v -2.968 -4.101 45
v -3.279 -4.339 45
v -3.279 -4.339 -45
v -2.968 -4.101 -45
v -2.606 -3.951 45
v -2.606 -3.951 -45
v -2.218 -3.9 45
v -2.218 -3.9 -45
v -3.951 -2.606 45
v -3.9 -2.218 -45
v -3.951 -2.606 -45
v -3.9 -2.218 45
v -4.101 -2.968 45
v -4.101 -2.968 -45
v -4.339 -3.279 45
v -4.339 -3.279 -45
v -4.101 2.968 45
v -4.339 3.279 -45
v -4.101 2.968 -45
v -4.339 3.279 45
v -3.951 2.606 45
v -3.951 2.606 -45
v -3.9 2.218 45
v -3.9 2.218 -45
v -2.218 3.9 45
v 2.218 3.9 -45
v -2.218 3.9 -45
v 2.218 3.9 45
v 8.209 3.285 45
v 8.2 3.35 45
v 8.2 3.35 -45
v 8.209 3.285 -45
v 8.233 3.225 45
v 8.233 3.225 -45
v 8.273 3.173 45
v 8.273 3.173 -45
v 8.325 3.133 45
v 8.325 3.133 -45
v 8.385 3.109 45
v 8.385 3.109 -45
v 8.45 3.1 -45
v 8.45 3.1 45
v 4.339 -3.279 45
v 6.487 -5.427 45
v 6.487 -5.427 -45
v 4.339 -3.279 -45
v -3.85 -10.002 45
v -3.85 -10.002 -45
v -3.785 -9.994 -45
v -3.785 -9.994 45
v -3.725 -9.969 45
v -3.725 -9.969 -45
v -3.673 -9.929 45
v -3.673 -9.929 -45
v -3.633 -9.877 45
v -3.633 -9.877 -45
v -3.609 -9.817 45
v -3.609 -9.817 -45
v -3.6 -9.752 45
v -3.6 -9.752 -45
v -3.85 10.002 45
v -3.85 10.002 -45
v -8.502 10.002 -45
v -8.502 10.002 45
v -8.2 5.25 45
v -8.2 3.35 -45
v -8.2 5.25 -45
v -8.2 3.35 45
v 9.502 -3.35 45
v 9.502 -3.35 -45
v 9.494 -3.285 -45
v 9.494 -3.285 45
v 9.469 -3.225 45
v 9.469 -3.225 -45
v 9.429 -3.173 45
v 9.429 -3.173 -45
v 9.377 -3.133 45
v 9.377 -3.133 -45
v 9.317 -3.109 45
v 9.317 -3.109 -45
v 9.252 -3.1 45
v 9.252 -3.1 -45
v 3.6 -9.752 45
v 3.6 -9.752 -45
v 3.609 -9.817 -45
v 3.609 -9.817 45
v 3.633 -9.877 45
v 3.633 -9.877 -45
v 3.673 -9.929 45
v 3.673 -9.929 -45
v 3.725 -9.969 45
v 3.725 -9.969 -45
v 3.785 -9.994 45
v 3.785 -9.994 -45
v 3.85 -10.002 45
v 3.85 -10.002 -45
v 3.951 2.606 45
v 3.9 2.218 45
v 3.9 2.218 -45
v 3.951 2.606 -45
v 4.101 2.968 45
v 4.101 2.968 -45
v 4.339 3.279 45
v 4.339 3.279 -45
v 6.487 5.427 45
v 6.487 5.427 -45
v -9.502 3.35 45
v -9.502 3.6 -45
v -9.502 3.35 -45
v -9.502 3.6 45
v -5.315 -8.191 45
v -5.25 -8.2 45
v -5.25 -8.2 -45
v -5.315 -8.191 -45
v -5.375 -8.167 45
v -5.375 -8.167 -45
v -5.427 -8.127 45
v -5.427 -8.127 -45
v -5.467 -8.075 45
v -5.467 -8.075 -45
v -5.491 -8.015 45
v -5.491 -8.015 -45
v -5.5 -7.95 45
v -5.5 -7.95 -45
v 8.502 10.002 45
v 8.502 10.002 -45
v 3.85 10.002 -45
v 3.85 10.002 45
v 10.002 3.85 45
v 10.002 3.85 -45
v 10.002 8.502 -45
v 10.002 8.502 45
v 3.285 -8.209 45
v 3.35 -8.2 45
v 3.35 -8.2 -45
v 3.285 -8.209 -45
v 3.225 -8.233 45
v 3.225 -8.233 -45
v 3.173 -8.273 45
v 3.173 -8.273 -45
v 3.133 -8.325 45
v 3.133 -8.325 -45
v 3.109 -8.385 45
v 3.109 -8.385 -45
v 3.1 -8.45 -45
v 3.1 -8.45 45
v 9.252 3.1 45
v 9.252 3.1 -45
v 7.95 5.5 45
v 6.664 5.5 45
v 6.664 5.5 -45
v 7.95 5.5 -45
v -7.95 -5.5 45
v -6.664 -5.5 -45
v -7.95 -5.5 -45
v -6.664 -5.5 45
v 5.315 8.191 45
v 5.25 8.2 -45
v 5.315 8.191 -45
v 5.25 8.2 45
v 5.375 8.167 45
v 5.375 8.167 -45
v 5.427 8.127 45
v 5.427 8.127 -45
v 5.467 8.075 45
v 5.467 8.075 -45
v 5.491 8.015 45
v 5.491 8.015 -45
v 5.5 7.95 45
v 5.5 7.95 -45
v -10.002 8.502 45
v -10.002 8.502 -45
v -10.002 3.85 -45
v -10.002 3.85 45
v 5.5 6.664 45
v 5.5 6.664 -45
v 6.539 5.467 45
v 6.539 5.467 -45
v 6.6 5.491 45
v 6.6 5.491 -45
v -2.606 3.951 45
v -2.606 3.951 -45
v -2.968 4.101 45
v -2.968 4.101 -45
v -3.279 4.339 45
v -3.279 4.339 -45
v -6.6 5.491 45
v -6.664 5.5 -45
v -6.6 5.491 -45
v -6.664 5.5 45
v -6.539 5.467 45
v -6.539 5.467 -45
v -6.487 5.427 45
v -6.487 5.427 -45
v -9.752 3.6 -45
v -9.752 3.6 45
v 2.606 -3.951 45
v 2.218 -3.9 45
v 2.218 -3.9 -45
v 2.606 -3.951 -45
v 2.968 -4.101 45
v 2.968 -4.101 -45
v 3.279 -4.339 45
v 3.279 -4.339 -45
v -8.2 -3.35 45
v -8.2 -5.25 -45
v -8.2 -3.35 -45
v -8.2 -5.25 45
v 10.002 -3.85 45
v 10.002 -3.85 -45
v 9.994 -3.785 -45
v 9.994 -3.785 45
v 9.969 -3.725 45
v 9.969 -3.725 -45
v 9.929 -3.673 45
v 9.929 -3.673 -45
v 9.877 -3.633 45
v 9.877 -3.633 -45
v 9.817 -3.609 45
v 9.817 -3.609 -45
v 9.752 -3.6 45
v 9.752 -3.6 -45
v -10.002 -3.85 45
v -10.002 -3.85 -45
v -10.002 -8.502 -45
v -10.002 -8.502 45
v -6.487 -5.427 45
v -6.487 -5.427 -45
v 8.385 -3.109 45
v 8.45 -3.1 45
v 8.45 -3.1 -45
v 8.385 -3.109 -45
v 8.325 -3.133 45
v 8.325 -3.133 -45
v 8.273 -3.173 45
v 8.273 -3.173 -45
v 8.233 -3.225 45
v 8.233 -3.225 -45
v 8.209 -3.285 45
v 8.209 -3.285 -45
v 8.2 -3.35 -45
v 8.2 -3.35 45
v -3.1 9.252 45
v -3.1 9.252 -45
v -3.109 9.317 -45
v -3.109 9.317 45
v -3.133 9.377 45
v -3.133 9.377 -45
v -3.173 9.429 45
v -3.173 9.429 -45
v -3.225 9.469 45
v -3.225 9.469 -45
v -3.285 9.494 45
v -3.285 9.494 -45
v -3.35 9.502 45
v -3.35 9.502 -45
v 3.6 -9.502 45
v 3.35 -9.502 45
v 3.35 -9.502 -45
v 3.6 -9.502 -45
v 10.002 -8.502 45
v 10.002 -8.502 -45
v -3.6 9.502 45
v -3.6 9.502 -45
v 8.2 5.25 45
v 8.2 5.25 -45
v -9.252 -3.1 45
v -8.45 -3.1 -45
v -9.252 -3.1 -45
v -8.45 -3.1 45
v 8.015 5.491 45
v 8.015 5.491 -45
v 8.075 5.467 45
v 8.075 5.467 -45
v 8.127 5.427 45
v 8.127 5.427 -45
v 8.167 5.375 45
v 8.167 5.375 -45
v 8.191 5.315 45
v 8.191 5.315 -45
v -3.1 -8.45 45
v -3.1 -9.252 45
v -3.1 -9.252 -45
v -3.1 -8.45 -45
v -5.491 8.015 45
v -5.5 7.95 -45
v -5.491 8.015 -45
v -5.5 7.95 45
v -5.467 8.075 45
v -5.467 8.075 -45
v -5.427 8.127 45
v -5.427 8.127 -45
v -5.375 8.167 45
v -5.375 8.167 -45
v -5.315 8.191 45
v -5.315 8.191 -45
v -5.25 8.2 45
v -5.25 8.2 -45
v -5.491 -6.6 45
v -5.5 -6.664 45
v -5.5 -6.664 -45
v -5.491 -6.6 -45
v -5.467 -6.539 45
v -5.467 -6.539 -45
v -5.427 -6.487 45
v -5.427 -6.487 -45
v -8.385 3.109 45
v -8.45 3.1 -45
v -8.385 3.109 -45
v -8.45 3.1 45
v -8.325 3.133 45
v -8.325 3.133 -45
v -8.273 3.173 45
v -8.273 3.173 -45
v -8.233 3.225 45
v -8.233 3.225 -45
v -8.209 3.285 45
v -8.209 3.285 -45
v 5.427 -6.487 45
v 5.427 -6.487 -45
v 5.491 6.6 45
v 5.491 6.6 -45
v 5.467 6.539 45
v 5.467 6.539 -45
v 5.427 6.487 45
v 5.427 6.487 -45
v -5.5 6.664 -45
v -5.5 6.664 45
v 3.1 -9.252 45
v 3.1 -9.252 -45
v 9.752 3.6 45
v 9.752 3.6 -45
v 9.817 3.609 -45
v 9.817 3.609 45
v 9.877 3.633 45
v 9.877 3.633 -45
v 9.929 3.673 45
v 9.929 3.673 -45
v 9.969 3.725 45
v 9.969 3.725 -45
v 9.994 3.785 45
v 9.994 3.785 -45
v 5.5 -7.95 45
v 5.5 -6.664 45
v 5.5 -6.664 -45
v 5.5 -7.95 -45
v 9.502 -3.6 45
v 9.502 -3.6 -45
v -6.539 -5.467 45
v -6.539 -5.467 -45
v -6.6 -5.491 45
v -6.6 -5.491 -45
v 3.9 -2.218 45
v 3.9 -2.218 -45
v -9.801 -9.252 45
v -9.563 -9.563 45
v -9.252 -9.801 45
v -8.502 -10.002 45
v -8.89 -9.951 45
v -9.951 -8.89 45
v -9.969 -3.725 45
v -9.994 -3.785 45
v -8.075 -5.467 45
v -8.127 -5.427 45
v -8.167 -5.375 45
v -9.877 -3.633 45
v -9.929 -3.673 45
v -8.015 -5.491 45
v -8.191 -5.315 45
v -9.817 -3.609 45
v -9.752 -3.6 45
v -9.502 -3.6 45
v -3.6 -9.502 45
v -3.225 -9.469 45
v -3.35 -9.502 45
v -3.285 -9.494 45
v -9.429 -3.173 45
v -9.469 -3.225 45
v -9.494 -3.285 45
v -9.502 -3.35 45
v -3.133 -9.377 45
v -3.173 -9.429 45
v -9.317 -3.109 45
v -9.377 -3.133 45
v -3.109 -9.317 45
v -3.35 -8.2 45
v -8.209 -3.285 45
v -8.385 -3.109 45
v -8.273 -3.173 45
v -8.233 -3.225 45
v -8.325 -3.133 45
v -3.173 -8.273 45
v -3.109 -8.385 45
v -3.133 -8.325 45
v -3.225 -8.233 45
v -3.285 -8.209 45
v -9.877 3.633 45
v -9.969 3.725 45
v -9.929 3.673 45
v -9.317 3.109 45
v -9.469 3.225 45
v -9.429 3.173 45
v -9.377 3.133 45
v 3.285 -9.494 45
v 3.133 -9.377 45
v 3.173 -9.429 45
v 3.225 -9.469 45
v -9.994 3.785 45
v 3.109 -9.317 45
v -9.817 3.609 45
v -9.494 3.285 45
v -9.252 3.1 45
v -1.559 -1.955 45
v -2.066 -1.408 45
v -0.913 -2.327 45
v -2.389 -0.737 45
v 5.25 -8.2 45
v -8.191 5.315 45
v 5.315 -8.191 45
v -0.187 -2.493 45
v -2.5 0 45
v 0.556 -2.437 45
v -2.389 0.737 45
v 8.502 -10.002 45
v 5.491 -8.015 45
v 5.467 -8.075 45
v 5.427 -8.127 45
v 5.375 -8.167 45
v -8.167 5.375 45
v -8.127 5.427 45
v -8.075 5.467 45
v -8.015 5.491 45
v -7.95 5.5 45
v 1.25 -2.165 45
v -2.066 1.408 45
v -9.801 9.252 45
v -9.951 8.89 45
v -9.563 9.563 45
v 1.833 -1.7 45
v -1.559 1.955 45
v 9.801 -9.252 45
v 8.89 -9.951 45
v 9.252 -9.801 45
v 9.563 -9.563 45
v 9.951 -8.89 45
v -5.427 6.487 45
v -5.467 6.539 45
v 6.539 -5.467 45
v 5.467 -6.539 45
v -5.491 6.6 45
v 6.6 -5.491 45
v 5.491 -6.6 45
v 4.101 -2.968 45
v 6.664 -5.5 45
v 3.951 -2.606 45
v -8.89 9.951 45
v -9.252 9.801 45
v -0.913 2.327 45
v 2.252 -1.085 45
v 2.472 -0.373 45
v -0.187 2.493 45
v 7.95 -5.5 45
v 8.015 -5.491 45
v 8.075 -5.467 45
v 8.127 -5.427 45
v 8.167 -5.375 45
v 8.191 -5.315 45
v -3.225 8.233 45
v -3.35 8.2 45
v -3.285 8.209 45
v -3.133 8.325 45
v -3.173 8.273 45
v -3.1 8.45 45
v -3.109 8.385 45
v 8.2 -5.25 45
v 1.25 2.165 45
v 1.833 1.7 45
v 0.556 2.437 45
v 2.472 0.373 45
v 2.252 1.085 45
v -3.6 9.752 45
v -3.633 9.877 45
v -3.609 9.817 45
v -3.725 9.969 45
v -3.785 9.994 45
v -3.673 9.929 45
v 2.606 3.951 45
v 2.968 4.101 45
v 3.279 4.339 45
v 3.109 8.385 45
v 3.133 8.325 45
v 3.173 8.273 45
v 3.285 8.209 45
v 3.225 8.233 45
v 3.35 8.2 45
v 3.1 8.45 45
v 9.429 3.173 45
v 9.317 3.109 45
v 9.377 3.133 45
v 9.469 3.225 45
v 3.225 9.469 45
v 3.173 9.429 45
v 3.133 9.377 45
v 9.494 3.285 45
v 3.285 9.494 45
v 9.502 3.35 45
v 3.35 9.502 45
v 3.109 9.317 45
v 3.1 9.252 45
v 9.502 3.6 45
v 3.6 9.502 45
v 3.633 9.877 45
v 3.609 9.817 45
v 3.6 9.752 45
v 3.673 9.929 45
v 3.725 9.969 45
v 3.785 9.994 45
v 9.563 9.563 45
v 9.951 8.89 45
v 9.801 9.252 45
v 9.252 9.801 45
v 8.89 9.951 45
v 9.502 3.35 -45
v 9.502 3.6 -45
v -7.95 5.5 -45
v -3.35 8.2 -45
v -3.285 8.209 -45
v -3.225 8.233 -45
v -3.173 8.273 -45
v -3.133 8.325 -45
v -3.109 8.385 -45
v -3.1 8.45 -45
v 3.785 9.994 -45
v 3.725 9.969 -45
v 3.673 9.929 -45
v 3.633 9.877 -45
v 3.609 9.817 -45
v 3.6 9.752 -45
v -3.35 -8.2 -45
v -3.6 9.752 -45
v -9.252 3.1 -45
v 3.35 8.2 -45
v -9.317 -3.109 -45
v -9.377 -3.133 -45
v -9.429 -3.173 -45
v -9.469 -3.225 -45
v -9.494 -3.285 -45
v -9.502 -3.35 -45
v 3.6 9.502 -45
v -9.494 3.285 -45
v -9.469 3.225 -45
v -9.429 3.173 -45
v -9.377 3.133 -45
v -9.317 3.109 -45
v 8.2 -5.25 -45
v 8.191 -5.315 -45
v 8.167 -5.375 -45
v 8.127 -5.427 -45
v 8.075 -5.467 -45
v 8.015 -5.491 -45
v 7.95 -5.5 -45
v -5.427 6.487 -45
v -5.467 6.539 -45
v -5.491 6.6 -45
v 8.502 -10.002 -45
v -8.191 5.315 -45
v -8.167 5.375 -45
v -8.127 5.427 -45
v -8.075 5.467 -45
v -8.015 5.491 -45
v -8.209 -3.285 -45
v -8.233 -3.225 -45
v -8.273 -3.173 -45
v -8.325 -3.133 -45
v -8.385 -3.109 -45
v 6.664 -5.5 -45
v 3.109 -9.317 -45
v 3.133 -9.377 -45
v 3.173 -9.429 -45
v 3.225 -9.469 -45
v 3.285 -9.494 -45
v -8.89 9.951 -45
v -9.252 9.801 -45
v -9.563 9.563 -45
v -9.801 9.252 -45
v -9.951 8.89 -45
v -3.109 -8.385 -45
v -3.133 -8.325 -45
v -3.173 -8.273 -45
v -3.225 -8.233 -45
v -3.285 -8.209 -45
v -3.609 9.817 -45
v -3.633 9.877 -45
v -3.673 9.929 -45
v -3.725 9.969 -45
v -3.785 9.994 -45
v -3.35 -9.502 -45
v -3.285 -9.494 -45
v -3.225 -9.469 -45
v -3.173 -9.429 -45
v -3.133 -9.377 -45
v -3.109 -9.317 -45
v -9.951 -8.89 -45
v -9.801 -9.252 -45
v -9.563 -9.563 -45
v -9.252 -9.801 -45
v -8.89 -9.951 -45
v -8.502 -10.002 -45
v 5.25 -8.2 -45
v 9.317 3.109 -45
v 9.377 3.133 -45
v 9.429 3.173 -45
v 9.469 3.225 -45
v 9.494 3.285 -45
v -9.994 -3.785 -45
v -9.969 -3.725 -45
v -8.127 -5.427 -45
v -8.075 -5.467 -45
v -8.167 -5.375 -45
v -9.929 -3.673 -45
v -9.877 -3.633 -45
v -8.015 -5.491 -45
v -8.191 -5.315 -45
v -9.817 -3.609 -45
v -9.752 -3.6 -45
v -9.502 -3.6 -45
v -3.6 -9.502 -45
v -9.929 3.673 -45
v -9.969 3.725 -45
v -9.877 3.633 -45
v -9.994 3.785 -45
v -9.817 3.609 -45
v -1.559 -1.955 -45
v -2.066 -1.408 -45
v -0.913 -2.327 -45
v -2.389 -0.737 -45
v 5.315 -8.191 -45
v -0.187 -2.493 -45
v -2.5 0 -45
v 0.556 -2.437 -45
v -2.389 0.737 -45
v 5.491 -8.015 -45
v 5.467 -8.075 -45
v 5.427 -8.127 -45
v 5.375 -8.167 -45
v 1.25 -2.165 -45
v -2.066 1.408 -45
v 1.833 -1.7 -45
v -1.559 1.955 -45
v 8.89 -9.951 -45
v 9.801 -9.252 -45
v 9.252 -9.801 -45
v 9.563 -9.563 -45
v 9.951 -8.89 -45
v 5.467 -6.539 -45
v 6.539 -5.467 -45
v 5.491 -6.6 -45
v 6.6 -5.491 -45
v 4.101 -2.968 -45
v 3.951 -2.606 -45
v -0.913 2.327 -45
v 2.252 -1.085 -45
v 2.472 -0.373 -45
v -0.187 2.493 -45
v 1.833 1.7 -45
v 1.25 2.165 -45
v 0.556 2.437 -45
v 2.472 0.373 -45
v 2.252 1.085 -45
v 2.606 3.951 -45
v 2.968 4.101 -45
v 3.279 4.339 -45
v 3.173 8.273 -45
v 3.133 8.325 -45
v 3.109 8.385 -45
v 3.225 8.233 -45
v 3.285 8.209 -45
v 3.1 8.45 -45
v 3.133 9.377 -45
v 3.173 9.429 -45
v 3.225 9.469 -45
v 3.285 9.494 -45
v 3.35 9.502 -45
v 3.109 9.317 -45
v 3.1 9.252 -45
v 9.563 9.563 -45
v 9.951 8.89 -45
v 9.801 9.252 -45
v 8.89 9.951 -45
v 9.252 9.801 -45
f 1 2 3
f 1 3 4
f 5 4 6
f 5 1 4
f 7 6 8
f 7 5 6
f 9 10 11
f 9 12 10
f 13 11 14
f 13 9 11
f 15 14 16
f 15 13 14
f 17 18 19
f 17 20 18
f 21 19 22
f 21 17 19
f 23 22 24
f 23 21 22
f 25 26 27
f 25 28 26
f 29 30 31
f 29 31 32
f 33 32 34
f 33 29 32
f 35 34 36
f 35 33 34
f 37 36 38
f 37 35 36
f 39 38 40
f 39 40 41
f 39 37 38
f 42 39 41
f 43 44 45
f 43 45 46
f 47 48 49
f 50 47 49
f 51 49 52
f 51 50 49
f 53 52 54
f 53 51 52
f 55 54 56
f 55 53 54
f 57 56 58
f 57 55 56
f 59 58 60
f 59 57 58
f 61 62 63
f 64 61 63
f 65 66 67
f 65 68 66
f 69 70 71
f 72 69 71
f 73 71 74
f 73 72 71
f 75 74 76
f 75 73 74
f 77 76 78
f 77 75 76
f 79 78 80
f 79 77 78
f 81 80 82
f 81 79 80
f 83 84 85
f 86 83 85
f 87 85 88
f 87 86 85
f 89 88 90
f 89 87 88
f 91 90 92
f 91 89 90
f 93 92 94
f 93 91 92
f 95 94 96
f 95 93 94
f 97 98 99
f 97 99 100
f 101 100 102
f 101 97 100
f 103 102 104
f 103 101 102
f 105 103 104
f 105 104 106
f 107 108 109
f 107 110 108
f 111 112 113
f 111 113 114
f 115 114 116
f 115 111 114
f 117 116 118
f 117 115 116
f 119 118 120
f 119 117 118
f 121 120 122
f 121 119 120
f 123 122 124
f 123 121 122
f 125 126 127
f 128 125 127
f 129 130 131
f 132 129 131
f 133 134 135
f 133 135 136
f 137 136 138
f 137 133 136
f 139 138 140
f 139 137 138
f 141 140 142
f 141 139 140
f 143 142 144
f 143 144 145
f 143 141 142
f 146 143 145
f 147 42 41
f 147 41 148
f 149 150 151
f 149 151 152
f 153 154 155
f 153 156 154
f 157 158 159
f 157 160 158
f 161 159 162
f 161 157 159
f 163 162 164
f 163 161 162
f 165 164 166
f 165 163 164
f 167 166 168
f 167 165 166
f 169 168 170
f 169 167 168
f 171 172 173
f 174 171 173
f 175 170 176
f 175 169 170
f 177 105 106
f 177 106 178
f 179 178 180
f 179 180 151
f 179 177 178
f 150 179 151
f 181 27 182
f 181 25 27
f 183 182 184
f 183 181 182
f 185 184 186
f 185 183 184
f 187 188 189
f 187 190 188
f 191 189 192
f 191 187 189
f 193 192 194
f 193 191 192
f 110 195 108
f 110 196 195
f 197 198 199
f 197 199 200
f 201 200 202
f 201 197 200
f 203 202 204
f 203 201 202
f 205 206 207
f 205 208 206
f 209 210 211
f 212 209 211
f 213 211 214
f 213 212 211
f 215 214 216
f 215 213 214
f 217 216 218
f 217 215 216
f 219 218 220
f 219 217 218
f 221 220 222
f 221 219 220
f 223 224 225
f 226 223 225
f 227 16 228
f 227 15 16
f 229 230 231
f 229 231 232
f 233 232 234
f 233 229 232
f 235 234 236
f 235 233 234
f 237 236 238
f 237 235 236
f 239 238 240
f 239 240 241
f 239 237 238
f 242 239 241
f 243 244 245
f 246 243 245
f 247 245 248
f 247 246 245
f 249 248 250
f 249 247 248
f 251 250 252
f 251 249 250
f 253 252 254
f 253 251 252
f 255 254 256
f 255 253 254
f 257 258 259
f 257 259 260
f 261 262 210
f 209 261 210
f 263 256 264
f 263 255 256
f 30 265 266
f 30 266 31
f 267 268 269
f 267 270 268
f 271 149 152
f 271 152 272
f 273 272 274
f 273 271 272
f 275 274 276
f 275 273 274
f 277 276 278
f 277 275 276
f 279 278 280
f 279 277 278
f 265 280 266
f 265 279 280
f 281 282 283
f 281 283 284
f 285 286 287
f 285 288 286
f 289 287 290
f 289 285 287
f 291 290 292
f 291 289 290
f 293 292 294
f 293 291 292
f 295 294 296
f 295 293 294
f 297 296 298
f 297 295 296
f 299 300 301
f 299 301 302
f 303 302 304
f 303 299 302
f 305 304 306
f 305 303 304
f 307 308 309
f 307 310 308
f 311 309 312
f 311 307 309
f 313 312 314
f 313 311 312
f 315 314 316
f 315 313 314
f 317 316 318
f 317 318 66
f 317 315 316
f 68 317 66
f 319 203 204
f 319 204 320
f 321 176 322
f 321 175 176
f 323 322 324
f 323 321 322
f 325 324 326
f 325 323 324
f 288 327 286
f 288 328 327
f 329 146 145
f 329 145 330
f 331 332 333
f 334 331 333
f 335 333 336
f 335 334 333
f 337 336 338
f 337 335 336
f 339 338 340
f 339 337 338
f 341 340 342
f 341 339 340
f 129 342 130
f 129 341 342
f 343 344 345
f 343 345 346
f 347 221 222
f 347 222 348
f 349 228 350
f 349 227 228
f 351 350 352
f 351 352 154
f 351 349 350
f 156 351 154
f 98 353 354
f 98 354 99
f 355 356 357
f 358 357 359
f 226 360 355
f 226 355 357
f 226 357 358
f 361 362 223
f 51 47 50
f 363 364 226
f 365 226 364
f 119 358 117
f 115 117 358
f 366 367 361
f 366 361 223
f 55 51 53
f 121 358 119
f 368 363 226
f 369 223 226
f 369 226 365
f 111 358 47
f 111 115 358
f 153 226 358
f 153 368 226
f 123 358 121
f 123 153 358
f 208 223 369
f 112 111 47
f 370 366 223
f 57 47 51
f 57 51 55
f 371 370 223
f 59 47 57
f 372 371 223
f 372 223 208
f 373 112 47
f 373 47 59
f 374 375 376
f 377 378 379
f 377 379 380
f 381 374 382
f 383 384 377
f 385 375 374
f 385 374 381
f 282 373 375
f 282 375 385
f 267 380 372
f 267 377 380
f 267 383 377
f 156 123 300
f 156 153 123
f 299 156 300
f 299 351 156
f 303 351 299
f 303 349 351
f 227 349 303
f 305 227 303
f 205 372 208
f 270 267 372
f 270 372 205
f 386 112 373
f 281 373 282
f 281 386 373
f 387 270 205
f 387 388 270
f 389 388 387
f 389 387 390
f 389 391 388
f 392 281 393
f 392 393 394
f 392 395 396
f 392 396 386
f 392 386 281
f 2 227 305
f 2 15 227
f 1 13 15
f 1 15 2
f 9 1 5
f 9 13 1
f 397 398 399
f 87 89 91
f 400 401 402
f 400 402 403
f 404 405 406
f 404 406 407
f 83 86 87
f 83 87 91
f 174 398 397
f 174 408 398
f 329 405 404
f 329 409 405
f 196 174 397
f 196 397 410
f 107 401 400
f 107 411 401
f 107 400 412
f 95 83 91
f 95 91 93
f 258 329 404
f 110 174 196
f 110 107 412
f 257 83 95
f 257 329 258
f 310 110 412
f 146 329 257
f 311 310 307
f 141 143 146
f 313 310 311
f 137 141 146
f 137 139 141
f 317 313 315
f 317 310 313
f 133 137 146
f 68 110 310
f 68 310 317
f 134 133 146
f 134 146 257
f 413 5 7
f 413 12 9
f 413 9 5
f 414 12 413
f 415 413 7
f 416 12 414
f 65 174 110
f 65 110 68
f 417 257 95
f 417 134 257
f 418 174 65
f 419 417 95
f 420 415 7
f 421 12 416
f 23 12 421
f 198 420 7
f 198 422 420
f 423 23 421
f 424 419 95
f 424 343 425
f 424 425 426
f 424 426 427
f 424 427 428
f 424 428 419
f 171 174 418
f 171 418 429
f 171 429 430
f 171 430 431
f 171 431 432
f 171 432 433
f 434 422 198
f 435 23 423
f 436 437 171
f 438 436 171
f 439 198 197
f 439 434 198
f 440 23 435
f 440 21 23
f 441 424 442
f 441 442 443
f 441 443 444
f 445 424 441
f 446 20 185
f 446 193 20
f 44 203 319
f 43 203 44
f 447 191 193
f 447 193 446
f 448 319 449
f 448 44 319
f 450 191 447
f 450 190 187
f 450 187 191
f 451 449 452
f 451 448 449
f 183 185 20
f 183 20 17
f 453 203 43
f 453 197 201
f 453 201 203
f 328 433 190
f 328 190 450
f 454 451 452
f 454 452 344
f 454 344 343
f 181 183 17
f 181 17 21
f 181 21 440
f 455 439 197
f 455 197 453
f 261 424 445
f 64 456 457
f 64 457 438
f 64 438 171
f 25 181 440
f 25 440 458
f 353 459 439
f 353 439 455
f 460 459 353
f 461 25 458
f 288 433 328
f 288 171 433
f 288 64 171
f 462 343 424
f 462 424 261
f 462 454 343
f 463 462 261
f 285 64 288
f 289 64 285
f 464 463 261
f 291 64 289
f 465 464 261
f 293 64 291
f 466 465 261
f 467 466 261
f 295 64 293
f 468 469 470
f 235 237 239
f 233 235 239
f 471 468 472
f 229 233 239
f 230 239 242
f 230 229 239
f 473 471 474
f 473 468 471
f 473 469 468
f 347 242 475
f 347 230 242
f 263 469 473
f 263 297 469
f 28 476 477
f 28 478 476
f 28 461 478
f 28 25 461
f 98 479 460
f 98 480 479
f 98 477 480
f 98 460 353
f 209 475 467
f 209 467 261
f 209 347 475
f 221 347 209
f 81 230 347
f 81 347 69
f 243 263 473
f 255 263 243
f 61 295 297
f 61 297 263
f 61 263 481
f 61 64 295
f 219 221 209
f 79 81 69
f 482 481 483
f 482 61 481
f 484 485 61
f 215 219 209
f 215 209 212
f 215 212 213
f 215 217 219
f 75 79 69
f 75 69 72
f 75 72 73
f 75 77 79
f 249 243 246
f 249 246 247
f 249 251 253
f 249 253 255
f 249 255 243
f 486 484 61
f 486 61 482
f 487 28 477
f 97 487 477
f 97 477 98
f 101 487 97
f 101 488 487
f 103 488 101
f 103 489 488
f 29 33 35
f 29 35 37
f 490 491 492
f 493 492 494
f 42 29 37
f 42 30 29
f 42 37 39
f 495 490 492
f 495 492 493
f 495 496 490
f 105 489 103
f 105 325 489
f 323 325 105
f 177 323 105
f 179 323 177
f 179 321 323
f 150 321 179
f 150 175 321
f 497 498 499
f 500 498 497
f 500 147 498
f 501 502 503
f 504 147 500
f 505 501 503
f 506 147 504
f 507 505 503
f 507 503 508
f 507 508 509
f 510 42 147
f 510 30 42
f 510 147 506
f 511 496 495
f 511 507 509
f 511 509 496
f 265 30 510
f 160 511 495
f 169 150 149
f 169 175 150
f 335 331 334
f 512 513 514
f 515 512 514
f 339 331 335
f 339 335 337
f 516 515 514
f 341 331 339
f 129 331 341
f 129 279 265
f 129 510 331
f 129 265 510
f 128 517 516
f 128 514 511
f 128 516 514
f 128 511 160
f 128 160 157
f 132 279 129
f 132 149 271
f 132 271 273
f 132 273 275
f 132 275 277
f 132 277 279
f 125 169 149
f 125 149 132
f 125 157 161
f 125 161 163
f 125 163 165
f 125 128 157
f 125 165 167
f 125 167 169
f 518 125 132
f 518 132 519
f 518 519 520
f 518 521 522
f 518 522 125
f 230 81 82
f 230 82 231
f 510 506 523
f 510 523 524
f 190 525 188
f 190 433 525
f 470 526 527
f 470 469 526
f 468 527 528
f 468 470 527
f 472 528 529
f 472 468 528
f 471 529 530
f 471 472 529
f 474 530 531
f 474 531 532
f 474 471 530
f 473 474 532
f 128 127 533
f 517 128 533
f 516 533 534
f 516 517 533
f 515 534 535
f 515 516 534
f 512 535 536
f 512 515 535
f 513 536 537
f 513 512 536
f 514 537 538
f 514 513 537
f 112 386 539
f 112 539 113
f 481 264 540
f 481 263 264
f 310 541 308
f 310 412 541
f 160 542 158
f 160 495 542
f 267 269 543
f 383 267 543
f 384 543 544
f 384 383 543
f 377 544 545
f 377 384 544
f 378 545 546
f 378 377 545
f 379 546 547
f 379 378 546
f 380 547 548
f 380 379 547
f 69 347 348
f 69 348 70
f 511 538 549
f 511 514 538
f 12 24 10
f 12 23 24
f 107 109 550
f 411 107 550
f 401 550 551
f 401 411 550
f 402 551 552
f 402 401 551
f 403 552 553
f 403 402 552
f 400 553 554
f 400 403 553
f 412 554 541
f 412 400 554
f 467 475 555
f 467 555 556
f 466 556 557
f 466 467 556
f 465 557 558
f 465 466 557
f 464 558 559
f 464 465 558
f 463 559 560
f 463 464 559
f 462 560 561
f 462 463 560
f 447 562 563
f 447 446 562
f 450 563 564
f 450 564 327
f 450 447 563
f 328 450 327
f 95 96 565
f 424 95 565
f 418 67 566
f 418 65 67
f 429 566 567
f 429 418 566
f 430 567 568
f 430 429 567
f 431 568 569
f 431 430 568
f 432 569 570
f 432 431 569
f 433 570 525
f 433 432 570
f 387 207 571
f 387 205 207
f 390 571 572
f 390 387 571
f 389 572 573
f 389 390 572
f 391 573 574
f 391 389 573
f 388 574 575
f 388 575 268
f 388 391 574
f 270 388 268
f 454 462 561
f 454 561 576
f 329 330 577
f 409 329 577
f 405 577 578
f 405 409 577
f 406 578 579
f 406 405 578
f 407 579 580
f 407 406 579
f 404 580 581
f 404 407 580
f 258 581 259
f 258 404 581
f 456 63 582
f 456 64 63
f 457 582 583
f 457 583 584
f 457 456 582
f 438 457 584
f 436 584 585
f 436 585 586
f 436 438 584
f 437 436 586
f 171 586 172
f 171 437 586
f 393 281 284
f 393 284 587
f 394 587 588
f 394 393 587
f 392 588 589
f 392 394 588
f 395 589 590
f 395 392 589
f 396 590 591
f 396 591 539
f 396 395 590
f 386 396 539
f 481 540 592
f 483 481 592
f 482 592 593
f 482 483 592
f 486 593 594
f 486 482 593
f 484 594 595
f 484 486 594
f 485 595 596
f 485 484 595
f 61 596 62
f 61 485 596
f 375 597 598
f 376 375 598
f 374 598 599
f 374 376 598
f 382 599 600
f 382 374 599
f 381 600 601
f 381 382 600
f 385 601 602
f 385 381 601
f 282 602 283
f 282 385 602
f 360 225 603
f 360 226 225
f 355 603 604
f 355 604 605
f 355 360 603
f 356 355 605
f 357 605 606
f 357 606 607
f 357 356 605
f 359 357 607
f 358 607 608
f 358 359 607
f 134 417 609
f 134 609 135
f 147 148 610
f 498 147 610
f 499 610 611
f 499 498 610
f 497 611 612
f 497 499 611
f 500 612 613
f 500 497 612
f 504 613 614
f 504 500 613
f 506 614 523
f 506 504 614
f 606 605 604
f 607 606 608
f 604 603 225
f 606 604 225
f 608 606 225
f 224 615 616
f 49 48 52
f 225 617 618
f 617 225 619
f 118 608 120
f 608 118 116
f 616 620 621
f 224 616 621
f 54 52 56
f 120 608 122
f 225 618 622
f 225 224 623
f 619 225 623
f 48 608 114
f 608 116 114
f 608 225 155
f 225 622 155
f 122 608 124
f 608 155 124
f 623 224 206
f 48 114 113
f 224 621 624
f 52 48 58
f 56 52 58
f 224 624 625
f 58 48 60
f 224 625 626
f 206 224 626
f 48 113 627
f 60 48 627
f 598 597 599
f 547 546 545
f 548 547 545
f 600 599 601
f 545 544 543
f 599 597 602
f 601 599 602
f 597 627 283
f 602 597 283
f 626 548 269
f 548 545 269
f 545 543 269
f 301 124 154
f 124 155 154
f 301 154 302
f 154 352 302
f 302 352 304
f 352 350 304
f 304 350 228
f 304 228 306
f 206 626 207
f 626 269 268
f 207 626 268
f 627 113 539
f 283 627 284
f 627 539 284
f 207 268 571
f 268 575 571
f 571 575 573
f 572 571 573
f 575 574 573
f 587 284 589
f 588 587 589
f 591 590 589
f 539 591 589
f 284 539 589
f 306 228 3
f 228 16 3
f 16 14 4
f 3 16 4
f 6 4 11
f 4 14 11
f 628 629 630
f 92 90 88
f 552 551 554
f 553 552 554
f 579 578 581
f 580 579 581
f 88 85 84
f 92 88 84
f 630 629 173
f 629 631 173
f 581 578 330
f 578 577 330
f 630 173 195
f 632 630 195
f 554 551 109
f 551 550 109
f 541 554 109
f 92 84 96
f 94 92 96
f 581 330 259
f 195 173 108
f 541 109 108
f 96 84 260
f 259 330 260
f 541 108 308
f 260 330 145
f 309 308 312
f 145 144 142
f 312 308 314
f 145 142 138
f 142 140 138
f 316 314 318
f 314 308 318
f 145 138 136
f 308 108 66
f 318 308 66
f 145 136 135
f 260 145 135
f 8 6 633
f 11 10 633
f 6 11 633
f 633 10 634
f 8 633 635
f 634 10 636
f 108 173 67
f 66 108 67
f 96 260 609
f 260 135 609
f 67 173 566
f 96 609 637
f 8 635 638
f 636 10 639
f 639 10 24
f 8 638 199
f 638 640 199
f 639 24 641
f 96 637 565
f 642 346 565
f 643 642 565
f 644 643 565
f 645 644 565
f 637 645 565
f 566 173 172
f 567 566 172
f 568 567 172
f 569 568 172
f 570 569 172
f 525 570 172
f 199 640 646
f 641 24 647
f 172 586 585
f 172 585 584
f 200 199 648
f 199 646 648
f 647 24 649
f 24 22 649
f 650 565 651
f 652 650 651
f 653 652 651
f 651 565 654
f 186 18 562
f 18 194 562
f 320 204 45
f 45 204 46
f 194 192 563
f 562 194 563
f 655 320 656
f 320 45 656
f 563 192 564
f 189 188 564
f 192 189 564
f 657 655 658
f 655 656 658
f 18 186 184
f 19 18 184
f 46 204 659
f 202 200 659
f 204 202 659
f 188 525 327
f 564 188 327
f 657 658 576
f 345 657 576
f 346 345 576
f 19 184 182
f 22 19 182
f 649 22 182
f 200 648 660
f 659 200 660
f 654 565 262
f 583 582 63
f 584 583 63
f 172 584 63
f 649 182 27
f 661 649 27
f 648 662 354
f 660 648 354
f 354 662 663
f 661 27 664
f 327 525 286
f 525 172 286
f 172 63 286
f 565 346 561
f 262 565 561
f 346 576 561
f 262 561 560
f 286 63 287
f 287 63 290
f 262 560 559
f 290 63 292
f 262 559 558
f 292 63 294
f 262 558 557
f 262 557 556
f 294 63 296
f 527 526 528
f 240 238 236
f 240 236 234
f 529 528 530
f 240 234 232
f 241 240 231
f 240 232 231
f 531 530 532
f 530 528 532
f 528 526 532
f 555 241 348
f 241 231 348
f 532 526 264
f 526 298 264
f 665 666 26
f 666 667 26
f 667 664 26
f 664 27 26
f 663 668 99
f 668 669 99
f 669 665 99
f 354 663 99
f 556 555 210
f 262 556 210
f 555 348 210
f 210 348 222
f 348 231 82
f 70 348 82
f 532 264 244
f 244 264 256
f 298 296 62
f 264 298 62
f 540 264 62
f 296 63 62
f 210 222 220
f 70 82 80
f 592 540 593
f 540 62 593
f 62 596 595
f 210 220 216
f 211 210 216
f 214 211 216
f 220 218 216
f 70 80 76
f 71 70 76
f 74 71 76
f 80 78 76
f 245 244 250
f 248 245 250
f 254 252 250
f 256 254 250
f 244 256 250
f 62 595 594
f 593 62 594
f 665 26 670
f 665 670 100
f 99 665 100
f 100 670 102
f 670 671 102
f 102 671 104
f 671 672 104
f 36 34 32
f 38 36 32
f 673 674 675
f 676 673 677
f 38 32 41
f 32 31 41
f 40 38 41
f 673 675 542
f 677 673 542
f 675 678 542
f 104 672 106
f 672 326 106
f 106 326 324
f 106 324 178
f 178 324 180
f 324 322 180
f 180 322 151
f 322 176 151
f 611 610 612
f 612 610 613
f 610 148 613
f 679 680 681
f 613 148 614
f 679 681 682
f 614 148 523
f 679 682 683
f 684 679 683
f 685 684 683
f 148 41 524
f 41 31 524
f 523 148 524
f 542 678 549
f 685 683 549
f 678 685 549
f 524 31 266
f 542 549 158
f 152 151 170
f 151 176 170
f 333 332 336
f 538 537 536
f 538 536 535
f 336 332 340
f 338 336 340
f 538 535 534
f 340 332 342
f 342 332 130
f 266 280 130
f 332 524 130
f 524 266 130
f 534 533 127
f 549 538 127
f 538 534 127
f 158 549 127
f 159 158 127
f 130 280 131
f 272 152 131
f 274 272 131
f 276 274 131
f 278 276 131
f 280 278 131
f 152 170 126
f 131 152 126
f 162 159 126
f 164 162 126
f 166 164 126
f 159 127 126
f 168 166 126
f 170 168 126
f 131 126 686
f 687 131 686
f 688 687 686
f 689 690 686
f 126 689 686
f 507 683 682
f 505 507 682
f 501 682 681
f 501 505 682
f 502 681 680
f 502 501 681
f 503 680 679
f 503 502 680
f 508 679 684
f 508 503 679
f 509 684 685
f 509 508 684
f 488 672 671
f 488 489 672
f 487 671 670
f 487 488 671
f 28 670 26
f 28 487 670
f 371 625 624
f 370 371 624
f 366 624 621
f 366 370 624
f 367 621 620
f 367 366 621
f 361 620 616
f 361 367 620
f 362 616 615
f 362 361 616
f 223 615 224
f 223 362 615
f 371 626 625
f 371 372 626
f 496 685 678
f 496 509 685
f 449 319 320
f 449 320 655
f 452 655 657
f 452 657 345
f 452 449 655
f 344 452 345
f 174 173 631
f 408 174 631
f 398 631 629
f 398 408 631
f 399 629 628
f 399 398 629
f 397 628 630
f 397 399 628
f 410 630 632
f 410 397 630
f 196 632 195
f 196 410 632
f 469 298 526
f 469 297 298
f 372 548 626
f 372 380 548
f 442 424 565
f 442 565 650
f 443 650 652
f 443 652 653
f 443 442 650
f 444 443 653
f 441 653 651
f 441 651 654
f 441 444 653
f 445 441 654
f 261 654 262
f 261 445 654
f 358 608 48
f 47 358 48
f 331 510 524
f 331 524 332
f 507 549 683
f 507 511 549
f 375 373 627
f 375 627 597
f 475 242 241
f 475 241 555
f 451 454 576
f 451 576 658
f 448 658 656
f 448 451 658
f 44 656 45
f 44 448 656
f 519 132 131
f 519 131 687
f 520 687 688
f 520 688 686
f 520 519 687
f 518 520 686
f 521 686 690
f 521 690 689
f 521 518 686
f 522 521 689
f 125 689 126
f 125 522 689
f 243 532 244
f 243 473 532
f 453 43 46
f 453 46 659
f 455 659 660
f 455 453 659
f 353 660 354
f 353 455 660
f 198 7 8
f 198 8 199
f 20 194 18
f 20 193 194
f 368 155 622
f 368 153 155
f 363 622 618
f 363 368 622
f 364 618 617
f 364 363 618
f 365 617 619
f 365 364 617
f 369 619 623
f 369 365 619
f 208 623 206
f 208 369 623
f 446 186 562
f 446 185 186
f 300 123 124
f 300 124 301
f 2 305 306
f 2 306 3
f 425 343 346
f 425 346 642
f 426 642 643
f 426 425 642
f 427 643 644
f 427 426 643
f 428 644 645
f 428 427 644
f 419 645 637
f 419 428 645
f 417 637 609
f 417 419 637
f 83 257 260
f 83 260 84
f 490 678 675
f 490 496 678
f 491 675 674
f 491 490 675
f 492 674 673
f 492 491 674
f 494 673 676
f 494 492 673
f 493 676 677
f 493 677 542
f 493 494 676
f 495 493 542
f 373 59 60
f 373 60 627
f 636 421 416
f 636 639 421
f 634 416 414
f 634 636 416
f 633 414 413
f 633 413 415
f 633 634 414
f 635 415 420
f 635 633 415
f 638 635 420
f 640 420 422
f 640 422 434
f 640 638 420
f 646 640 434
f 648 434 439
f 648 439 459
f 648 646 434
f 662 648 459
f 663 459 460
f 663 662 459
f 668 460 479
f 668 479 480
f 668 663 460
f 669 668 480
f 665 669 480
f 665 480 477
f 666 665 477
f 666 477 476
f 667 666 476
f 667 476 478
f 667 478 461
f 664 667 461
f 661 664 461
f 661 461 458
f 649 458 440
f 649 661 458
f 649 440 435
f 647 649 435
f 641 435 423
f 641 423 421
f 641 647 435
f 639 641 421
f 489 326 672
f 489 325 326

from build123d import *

# Parameters (mm, degrees)
SKETCH_1_R      = 2.5
EXTRUDE_1_DEPTH = 45


with BuildPart() as part:
    # 草图1 → 凸台-拉伸1 (new, symmetric)
    with BuildSketch(Plane.XY):
        with BuildLine():
            Line((-8.502261885, -10.002261885), (-3.85, -10.002261885))
            ThreePointArc((-3.85, -10.002261885), (-3.673223305, -9.929038581), (-3.6, -9.752261885))
            Line((-3.6, -9.752261885), (-3.6, -9.502261885))
            Line((-3.6, -9.502261885), (-3.35, -9.502261885))
            ThreePointArc((-3.35, -9.502261885), (-3.173223305, -9.429038581), (-3.1, -9.252261885))
            Line((-3.1, -9.252261885), (-3.1, -8.45))
            ThreePointArc((-3.1, -8.45), (-3.173223305, -8.273223305), (-3.35, -8.2))
            Line((-3.35, -8.2), (-5.25, -8.2))
            ThreePointArc((-5.25, -8.2), (-5.426776695, -8.126776695), (-5.5, -7.95))
            Line((-5.5, -7.95), (-5.5, -6.664213562))
            ThreePointArc((-5.5, -6.664213562), (-5.480969883, -6.568542704), (-5.426776695, -6.487436867))
            Line((-5.426776695, -6.487436867), (-3.278679656, -4.339339828))
            ThreePointArc((-3.278679656, -4.339339828), (-2.792044633, -4.014180701), (-2.218019485, -3.9))
            Line((-2.218019485, -3.9), (2.218019485, -3.9))
            ThreePointArc((2.218019485, -3.9), (2.792044633, -4.014180701), (3.278679656, -4.339339828))
            Line((3.278679656, -4.339339828), (5.426776695, -6.487436867))
            ThreePointArc((5.426776695, -6.487436867), (5.480969883, -6.568542704), (5.5, -6.664213562))
            Line((5.5, -6.664213562), (5.5, -7.95))
            ThreePointArc((5.5, -7.95), (5.426776695, -8.126776695), (5.25, -8.2))
            Line((5.25, -8.2), (3.35, -8.2))
            ThreePointArc((3.35, -8.2), (3.173223305, -8.273223305), (3.1, -8.45))
            Line((3.1, -8.45), (3.1, -9.252261885))
            ThreePointArc((3.1, -9.252261885), (3.173223305, -9.429038581), (3.35, -9.502261885))
            Line((3.35, -9.502261885), (3.6, -9.502261885))
            Line((3.6, -9.502261885), (3.6, -9.752261885))
            ThreePointArc((3.6, -9.752261885), (3.673223305, -9.929038581), (3.85, -10.002261885))
            Line((3.85, -10.002261885), (8.502261885, -10.002261885))
            ThreePointArc((8.502261885, -10.002261885), (9.562922057, -9.562922057), (10.002261885, -8.502261885))
            Line((10.002261885, -8.502261885), (10.002261885, -3.85))
            ThreePointArc((10.002261885, -3.85), (9.929038581, -3.673223305), (9.752261885, -3.6))
            Line((9.752261885, -3.6), (9.502261885, -3.6))
            Line((9.502261885, -3.6), (9.502261885, -3.35))
            ThreePointArc((9.502261885, -3.35), (9.429038581, -3.173223305), (9.252261885, -3.1))
            Line((9.252261885, -3.1), (8.45, -3.1))
            ThreePointArc((8.45, -3.1), (8.273223305, -3.173223305), (8.2, -3.35))
            Line((8.2, -3.35), (8.2, -5.25))
            ThreePointArc((8.2, -5.25), (8.126776695, -5.426776695), (7.95, -5.5))
            Line((7.95, -5.5), (6.664213562, -5.5))
            ThreePointArc((6.664213562, -5.5), (6.568542704, -5.480969883), (6.487436867, -5.426776695))
            Line((6.487436867, -5.426776695), (4.339339828, -3.278679656))
            ThreePointArc((4.339339828, -3.278679656), (4.014180701, -2.792044633), (3.9, -2.218019485))
            Line((3.9, -2.218019485), (3.9, 2.218019485))
            ThreePointArc((3.9, 2.218019485), (4.014180701, 2.792044633), (4.339339828, 3.278679656))
            Line((4.339339828, 3.278679656), (6.487436867, 5.426776695))
            ThreePointArc((6.487436867, 5.426776695), (6.568542704, 5.480969883), (6.664213562, 5.5))
            Line((6.664213562, 5.5), (7.95, 5.5))
            ThreePointArc((7.95, 5.5), (8.126776695, 5.426776695), (8.2, 5.25))
            Line((8.2, 5.25), (8.2, 3.35))
            ThreePointArc((8.2, 3.35), (8.273223305, 3.173223305), (8.45, 3.1))
            Line((8.45, 3.1), (9.252261885, 3.1))
            ThreePointArc((9.252261885, 3.1), (9.429038581, 3.173223305), (9.502261885, 3.35))
            Line((9.502261885, 3.35), (9.502261885, 3.6))
            Line((9.502261885, 3.6), (9.752261885, 3.6))
            ThreePointArc((9.752261885, 3.6), (9.929038581, 3.673223305), (10.002261885, 3.85))
            Line((10.002261885, 3.85), (10.002261885, 8.502261885))
            ThreePointArc((10.002261885, 8.502261885), (9.562922057, 9.562922057), (8.502261885, 10.002261885))
            Line((8.502261885, 10.002261885), (3.85, 10.002261885))
            ThreePointArc((3.85, 10.002261885), (3.673223305, 9.929038581), (3.6, 9.752261885))
            Line((3.6, 9.752261885), (3.6, 9.502261885))
            Line((3.6, 9.502261885), (3.35, 9.502261885))
            ThreePointArc((3.35, 9.502261885), (3.173223305, 9.429038581), (3.1, 9.252261885))
            Line((3.1, 9.252261885), (3.1, 8.45))
            ThreePointArc((3.1, 8.45), (3.173223305, 8.273223305), (3.35, 8.2))
            Line((3.35, 8.2), (5.25, 8.2))
            ThreePointArc((5.25, 8.2), (5.426776695, 8.126776695), (5.5, 7.95))
            Line((5.5, 7.95), (5.5, 6.664213562))
            ThreePointArc((5.5, 6.664213562), (5.480969883, 6.568542704), (5.426776695, 6.487436867))
            Line((5.426776695, 6.487436867), (3.278679656, 4.339339828))
            ThreePointArc((3.278679656, 4.339339828), (2.792044633, 4.014180701), (2.218019485, 3.9))
            Line((2.218019485, 3.9), (-2.218019485, 3.9))
            ThreePointArc((-2.218019485, 3.9), (-2.792044633, 4.014180701), (-3.278679656, 4.339339828))
            Line((-3.278679656, 4.339339828), (-5.426776695, 6.487436867))
            ThreePointArc((-5.426776695, 6.487436867), (-5.480969883, 6.568542704), (-5.5, 6.664213562))
            Line((-5.5, 6.664213562), (-5.5, 7.95))
            ThreePointArc((-5.5, 7.95), (-5.426776695, 8.126776695), (-5.25, 8.2))
            Line((-5.25, 8.2), (-3.35, 8.2))
            ThreePointArc((-3.35, 8.2), (-3.173223305, 8.273223305), (-3.1, 8.45))
            Line((-3.1, 8.45), (-3.1, 9.252261885))
            ThreePointArc((-3.1, 9.252261885), (-3.173223305, 9.429038581), (-3.35, 9.502261885))
            Line((-3.35, 9.502261885), (-3.6, 9.502261885))
            Line((-3.6, 9.502261885), (-3.6, 9.752261885))
            ThreePointArc((-3.6, 9.752261885), (-3.673223305, 9.929038581), (-3.85, 10.002261885))
            Line((-3.85, 10.002261885), (-8.502261885, 10.002261885))
            ThreePointArc((-8.502261885, 10.002261885), (-9.562922057, 9.562922057), (-10.002261885, 8.502261885))
            Line((-10.002261885, 8.502261885), (-10.002261885, 3.85))
            ThreePointArc((-10.002261885, 3.85), (-9.929038581, 3.673223305), (-9.752261885, 3.6))
            Line((-9.752261885, 3.6), (-9.502261885, 3.6))
            Line((-9.502261885, 3.6), (-9.502261885, 3.35))
            ThreePointArc((-9.502261885, 3.35), (-9.429038581, 3.173223305), (-9.252261885, 3.1))
            Line((-9.252261885, 3.1), (-8.45, 3.1))
            ThreePointArc((-8.45, 3.1), (-8.273223305, 3.173223305), (-8.2, 3.35))
            Line((-8.2, 3.35), (-8.2, 5.25))
            ThreePointArc((-8.2, 5.25), (-8.126776695, 5.426776695), (-7.95, 5.5))
            Line((-7.95, 5.5), (-6.664213562, 5.5))
            ThreePointArc((-6.664213562, 5.5), (-6.568542704, 5.480969883), (-6.487436867, 5.426776695))
            Line((-6.487436867, 5.426776695), (-4.339339828, 3.278679656))
            ThreePointArc((-4.339339828, 3.278679656), (-4.014180701, 2.792044633), (-3.9, 2.218019485))
            Line((-3.9, 2.218019485), (-3.9, -2.218019485))
            ThreePointArc((-3.9, -2.218019485), (-4.014180701, -2.792044633), (-4.339339828, -3.278679656))
            Line((-4.339339828, -3.278679656), (-6.487436867, -5.426776695))
            ThreePointArc((-6.487436867, -5.426776695), (-6.568542704, -5.480969883), (-6.664213562, -5.5))
            Line((-6.664213562, -5.5), (-7.95, -5.5))
            ThreePointArc((-7.95, -5.5), (-8.126776695, -5.426776695), (-8.2, -5.25))
            Line((-8.2, -5.25), (-8.2, -3.35))
            ThreePointArc((-8.2, -3.35), (-8.273223305, -3.173223305), (-8.45, -3.1))
            Line((-8.45, -3.1), (-9.252261885, -3.1))
            ThreePointArc((-9.252261885, -3.1), (-9.429038581, -3.173223305), (-9.502261885, -3.35))
            Line((-9.502261885, -3.35), (-9.502261885, -3.6))
            Line((-9.502261885, -3.6), (-9.752261885, -3.6))
            ThreePointArc((-9.752261885, -3.6), (-9.929038581, -3.673223305), (-10.002261885, -3.85))
            Line((-10.002261885, -3.85), (-10.002261885, -8.502261885))
            ThreePointArc((-10.002261885, -8.502261885), (-9.562922057, -9.562922057), (-8.502261885, -10.002261885))
        make_face()
        with Locations(Location((0, 0, 0), (0, 0, 180))):
            Circle(SKETCH_1_R, mode=Mode.SUBTRACT)
    extrude(amount=EXTRUDE_1_DEPTH, both=True)


solid = part.part
